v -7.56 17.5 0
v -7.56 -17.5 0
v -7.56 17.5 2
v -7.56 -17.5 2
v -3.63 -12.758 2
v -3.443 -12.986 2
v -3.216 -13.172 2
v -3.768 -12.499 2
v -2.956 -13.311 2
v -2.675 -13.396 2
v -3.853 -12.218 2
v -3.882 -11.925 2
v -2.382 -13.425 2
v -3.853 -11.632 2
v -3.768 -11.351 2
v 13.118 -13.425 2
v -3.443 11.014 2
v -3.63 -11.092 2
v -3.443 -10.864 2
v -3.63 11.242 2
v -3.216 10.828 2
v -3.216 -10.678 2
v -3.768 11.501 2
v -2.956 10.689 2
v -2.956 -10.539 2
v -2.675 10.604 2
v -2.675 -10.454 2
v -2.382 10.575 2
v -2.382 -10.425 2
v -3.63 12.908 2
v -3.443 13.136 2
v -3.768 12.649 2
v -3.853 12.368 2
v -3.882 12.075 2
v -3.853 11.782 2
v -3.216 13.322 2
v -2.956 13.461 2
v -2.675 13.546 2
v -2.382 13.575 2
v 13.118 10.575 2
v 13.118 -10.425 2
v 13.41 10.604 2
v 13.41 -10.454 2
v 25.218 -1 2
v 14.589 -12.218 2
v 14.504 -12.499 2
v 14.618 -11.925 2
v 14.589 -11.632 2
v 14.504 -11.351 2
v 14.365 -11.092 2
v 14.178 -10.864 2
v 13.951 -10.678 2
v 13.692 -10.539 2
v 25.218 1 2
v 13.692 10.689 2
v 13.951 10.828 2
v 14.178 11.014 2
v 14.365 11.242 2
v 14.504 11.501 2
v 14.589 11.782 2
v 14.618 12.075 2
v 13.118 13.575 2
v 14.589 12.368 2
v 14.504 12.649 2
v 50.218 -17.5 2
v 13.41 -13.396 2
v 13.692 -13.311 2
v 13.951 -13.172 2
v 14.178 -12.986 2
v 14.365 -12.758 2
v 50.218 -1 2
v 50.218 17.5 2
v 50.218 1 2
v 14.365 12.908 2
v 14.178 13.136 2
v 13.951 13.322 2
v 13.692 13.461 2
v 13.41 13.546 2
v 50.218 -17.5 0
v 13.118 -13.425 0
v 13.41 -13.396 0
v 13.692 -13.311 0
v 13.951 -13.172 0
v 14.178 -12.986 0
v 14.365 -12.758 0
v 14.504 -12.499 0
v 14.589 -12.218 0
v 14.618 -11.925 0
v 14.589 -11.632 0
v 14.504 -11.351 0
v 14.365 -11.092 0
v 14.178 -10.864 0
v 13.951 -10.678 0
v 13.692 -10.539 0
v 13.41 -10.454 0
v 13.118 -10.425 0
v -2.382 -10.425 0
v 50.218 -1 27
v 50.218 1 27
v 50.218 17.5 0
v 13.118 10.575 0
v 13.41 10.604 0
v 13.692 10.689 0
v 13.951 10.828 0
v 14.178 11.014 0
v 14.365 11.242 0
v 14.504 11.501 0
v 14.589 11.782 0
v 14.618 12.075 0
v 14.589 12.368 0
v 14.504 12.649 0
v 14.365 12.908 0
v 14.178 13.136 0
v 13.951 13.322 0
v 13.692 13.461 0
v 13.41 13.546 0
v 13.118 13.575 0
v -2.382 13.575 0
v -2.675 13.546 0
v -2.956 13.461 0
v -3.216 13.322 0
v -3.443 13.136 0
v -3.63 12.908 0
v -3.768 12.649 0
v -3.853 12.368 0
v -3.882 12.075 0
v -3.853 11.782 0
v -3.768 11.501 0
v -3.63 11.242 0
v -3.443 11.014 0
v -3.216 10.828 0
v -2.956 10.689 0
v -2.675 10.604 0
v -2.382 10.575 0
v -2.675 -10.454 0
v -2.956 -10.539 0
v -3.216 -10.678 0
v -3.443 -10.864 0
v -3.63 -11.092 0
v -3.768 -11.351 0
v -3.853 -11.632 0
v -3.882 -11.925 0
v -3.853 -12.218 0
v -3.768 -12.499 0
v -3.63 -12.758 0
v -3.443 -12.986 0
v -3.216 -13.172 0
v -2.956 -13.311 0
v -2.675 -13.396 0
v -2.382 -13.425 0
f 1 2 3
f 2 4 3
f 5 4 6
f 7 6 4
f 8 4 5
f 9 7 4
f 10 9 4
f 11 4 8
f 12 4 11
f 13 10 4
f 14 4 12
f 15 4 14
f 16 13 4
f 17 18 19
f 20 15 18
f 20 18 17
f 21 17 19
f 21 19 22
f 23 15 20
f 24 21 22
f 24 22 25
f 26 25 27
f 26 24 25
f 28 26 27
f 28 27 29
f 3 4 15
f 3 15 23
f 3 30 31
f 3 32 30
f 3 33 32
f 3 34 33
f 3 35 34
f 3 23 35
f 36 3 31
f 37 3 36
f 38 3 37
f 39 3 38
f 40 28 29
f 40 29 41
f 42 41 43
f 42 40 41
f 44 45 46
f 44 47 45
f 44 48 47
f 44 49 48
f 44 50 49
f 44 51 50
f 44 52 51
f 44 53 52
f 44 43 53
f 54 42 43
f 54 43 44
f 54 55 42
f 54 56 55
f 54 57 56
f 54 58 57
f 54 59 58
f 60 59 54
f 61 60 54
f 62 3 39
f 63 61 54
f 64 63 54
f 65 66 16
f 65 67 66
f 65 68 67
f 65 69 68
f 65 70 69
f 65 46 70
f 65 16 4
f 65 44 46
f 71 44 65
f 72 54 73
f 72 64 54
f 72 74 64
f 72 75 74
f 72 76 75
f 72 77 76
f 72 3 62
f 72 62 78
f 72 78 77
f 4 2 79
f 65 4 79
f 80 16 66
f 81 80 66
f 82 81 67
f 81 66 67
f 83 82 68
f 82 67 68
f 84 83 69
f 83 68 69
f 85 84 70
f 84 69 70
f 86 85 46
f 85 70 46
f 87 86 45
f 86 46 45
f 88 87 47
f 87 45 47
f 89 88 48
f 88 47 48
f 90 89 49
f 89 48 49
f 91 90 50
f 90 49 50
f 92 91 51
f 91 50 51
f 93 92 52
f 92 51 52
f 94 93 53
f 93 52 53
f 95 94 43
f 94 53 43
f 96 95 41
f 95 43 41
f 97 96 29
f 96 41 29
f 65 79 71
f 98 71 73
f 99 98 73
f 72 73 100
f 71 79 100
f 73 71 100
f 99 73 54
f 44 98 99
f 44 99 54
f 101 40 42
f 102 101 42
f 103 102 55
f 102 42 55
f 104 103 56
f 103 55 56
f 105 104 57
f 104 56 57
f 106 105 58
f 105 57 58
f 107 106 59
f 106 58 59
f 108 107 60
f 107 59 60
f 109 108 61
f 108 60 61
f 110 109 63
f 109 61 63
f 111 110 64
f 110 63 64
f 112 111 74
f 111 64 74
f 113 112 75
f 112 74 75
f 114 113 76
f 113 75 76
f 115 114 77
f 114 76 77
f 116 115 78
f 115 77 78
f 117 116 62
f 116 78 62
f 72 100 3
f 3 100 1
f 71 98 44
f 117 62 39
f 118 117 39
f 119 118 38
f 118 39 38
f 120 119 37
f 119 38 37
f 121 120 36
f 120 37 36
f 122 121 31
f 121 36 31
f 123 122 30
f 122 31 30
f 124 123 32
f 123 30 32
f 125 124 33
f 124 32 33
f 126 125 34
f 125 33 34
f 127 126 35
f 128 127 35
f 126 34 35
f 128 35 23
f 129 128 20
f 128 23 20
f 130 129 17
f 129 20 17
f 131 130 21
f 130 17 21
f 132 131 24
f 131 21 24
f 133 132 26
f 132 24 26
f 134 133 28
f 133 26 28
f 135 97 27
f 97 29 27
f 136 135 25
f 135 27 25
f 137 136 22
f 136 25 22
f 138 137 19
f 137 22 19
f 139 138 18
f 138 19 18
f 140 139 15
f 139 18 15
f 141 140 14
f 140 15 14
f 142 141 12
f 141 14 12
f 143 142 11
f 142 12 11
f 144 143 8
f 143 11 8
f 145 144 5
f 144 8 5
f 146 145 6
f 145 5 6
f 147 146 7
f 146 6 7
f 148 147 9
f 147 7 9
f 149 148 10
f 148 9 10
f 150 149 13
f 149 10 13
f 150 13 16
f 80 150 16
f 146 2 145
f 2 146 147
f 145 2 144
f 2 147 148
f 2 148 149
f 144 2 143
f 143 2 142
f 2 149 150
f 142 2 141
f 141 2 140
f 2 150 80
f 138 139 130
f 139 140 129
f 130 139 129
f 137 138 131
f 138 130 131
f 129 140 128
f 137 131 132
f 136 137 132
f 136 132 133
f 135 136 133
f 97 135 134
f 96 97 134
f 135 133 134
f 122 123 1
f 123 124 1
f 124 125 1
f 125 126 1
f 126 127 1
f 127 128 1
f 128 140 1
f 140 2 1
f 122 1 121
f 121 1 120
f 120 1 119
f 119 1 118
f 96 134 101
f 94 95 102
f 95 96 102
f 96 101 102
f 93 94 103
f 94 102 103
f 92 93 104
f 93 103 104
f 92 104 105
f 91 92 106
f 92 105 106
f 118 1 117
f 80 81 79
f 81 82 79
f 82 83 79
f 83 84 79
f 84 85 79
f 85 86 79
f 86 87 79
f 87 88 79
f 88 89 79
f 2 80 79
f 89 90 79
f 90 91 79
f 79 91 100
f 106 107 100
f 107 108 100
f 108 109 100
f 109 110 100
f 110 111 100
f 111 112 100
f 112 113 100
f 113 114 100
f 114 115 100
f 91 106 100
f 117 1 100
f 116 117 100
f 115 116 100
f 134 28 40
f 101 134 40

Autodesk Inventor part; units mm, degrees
ref_plane "YZ Plane" through (0, 0, 0) normal (1, 0, 0) x (0, 1, 0)
ref_plane "XZ Plane" through (0, 0, 0) normal (0, 1, 0) x (-1, 0, 0)
ref_plane "XY Plane" through (0, 0, 0) normal (0, 0, 1) x (1, 0, 0)
ref_plane "Płaszczyzna konstrukcyjna1" through (3.373, 0, 0) normal (0, 0, 1) x (1, 0, 0)
sketch "Szkic1" plane through (3.373, 0, 0) normal (0, 0, 1) x (1, 0, 0)
  line L0 (-18.9331, -17.5) -> (46.8447, -17.5)
  line L1 (46.8447, -17.5) -> (46.8447, 17.5)
  line L2 (46.8447, 17.5) -> (-18.9331, 17.5)
  line L3 (-18.9331, 17.5) -> (-18.9331, -17.5)
  line L4 (-3.373, 0) -> (-37.9313, 0) construction
  line L5 (46.8447, 48.9998) -> (46.8447, 17.425) construction
  arc A0 (-19.7109, 13.5) -> (-19.7109, 10.5) centre (-19.7109, 12) ccw construction
  line L6 (-19.7109, 13.5) -> (-16.7109, 13.5) construction
  arc A1 (-16.7109, 10.5) -> (-16.7109, 13.5) centre (-16.7109, 12) ccw construction
  line L7 (-16.7109, 10.5) -> (-19.7109, 10.5) construction
  line L8 (-29.2109, -13.5) -> (-32.2109, -13.5) construction
  arc A2 (-32.2109, -10.5) -> (-32.2109, -13.5) centre (-32.2109, -12) ccw construction
  line L9 (-32.2109, -10.5) -> (-29.2109, -10.5) construction
  arc A3 (-29.2109, -13.5) -> (-29.2109, -10.5) centre (-29.2109, -12) ccw construction
  circle A4 centre (-16.7109, -12) radius 1.5 construction
  circle A5 centre (-32.2109, 12) radius 1.5 construction
  line L10 (-11.7109, 6.9) -> (-34.7109, 6.9) construction
  line L11 (-11.7109, -6.9) -> (-11.7109, 6.9) construction
  line L12 (-34.7109, -6.9) -> (-11.7109, -6.9) construction
  line L13 (-15.7109, -16) -> (-34.7109, -16) construction
  line L14 (-6.2109, -9.5) -> (-15.7109, -16) construction
  line L15 (-6.2109, 9.5) -> (-6.2109, -9.5) construction
  line L16 (-15.7109, 16) -> (-6.2109, 9.5) construction
  line L17 (-34.7109, 16) -> (-15.7109, 16) construction
  line L18 (-34.7109, -6.9) -> (-34.7109, -16) projected
  line L19 (-34.7109, 16) -> (-34.7109, 6.9) projected
  dimension "d0" = 35
extrude "Wyciągnięcie proste1" add sketch "Szkic1" along normal blind 2
sketch "Szkic2" plane through (0, 0, 0) normal (0, 1, 0) x (-1, 0, 0)
  line L0 (-50.2177, 2) -> (15.5601, 2) projected
  line L1 (-50.2177, 2) -> (-50.2177, 27)
  line L2 (-50.2177, 27) -> (-25.2177, 2)
  line L3 (-50.2177, 2) -> (-25.2177, 2)
  point P0 (0, 0)
  dimension "d3" = 25
  dimension "d4" = 25
extrude "Wyciągnięcie proste2" add sketch "Szkic2" along normal mid plane 2
sketch "Szkic3" plane through (3.373, 0, 2) normal (0, 0, 1) x (1, 0, 0)
  line L0 (-18.9331, 17.5) -> (-18.9331, -17.5) projected
  line L1 (-18.9331, -17.5) -> (-10.9331, -17.5)
  line L2 (-10.9331, -17.5) -> (-10.9331, 17.5)
  line L3 (-10.9331, 17.5) -> (-18.9331, 17.5)
  line L4 (-18.9331, 17.5) -> (-18.9331, -17.5)
  point P0 (-3.373, 0)
  dimension "d7" = 8
extrude "Wyciągnięcie proste3" cut sketch "Szkic3" against normal up to next
sketch "Szkic5" plane through (3.373, 0, 2) normal (0, 0, 1) x (1, 0, 0)
  circle A0 centre (-5.7553, 12.075) radius 1.5 projected
  arc A1 (9.7447, 10.575) -> (9.7447, 13.575) centre (9.7447, 12.075) ccw projected
  arc A2 (6.7447, 13.575) -> (6.7447, 10.575) centre (6.7447, 12.075) ccw projected
  arc A3 (-2.7553, -13.425) -> (-2.7553, -10.425) centre (-2.7553, -11.925) ccw projected
  arc A4 (-5.7553, -10.425) -> (-5.7553, -13.425) centre (-5.7553, -11.925) ccw projected
  circle A5 centre (9.7447, -11.925) radius 1.5 projected
  line L0 (-7.2553, -11.925) -> (11.2447, -11.925) construction
  line L1 (-5.7553, -13.425) -> (9.7447, -13.425)
  line L2 (9.7447, -10.425) -> (-5.7553, -10.425)
  arc A6 (-5.7553, -10.425) -> (-5.7553, -13.425) centre (-5.7553, -11.925) ccw
  arc A7 (9.7447, -13.425) -> (9.7447, -10.425) centre (9.7447, -11.925) ccw
  line L3 (-7.2553, 12.075) -> (11.2447, 12.075) construction
  line L4 (-5.7553, 10.575) -> (9.7447, 10.575)
  line L5 (9.7447, 13.575) -> (-5.7553, 13.575)
  arc A8 (-5.7553, 13.575) -> (-5.7553, 10.575) centre (-5.7553, 12.075) ccw
  arc A9 (9.7447, 10.575) -> (9.7447, 13.575) centre (9.7447, 12.075) ccw
  point P0 (-3.373, 0)
  point P1 (1.9947, -11.925)
  point P2 (1.9947, 12.075)
extrude "Wyciągnięcie proste5" cut sketch "Szkic5" against normal up to next
properties part number "hinge_support"
